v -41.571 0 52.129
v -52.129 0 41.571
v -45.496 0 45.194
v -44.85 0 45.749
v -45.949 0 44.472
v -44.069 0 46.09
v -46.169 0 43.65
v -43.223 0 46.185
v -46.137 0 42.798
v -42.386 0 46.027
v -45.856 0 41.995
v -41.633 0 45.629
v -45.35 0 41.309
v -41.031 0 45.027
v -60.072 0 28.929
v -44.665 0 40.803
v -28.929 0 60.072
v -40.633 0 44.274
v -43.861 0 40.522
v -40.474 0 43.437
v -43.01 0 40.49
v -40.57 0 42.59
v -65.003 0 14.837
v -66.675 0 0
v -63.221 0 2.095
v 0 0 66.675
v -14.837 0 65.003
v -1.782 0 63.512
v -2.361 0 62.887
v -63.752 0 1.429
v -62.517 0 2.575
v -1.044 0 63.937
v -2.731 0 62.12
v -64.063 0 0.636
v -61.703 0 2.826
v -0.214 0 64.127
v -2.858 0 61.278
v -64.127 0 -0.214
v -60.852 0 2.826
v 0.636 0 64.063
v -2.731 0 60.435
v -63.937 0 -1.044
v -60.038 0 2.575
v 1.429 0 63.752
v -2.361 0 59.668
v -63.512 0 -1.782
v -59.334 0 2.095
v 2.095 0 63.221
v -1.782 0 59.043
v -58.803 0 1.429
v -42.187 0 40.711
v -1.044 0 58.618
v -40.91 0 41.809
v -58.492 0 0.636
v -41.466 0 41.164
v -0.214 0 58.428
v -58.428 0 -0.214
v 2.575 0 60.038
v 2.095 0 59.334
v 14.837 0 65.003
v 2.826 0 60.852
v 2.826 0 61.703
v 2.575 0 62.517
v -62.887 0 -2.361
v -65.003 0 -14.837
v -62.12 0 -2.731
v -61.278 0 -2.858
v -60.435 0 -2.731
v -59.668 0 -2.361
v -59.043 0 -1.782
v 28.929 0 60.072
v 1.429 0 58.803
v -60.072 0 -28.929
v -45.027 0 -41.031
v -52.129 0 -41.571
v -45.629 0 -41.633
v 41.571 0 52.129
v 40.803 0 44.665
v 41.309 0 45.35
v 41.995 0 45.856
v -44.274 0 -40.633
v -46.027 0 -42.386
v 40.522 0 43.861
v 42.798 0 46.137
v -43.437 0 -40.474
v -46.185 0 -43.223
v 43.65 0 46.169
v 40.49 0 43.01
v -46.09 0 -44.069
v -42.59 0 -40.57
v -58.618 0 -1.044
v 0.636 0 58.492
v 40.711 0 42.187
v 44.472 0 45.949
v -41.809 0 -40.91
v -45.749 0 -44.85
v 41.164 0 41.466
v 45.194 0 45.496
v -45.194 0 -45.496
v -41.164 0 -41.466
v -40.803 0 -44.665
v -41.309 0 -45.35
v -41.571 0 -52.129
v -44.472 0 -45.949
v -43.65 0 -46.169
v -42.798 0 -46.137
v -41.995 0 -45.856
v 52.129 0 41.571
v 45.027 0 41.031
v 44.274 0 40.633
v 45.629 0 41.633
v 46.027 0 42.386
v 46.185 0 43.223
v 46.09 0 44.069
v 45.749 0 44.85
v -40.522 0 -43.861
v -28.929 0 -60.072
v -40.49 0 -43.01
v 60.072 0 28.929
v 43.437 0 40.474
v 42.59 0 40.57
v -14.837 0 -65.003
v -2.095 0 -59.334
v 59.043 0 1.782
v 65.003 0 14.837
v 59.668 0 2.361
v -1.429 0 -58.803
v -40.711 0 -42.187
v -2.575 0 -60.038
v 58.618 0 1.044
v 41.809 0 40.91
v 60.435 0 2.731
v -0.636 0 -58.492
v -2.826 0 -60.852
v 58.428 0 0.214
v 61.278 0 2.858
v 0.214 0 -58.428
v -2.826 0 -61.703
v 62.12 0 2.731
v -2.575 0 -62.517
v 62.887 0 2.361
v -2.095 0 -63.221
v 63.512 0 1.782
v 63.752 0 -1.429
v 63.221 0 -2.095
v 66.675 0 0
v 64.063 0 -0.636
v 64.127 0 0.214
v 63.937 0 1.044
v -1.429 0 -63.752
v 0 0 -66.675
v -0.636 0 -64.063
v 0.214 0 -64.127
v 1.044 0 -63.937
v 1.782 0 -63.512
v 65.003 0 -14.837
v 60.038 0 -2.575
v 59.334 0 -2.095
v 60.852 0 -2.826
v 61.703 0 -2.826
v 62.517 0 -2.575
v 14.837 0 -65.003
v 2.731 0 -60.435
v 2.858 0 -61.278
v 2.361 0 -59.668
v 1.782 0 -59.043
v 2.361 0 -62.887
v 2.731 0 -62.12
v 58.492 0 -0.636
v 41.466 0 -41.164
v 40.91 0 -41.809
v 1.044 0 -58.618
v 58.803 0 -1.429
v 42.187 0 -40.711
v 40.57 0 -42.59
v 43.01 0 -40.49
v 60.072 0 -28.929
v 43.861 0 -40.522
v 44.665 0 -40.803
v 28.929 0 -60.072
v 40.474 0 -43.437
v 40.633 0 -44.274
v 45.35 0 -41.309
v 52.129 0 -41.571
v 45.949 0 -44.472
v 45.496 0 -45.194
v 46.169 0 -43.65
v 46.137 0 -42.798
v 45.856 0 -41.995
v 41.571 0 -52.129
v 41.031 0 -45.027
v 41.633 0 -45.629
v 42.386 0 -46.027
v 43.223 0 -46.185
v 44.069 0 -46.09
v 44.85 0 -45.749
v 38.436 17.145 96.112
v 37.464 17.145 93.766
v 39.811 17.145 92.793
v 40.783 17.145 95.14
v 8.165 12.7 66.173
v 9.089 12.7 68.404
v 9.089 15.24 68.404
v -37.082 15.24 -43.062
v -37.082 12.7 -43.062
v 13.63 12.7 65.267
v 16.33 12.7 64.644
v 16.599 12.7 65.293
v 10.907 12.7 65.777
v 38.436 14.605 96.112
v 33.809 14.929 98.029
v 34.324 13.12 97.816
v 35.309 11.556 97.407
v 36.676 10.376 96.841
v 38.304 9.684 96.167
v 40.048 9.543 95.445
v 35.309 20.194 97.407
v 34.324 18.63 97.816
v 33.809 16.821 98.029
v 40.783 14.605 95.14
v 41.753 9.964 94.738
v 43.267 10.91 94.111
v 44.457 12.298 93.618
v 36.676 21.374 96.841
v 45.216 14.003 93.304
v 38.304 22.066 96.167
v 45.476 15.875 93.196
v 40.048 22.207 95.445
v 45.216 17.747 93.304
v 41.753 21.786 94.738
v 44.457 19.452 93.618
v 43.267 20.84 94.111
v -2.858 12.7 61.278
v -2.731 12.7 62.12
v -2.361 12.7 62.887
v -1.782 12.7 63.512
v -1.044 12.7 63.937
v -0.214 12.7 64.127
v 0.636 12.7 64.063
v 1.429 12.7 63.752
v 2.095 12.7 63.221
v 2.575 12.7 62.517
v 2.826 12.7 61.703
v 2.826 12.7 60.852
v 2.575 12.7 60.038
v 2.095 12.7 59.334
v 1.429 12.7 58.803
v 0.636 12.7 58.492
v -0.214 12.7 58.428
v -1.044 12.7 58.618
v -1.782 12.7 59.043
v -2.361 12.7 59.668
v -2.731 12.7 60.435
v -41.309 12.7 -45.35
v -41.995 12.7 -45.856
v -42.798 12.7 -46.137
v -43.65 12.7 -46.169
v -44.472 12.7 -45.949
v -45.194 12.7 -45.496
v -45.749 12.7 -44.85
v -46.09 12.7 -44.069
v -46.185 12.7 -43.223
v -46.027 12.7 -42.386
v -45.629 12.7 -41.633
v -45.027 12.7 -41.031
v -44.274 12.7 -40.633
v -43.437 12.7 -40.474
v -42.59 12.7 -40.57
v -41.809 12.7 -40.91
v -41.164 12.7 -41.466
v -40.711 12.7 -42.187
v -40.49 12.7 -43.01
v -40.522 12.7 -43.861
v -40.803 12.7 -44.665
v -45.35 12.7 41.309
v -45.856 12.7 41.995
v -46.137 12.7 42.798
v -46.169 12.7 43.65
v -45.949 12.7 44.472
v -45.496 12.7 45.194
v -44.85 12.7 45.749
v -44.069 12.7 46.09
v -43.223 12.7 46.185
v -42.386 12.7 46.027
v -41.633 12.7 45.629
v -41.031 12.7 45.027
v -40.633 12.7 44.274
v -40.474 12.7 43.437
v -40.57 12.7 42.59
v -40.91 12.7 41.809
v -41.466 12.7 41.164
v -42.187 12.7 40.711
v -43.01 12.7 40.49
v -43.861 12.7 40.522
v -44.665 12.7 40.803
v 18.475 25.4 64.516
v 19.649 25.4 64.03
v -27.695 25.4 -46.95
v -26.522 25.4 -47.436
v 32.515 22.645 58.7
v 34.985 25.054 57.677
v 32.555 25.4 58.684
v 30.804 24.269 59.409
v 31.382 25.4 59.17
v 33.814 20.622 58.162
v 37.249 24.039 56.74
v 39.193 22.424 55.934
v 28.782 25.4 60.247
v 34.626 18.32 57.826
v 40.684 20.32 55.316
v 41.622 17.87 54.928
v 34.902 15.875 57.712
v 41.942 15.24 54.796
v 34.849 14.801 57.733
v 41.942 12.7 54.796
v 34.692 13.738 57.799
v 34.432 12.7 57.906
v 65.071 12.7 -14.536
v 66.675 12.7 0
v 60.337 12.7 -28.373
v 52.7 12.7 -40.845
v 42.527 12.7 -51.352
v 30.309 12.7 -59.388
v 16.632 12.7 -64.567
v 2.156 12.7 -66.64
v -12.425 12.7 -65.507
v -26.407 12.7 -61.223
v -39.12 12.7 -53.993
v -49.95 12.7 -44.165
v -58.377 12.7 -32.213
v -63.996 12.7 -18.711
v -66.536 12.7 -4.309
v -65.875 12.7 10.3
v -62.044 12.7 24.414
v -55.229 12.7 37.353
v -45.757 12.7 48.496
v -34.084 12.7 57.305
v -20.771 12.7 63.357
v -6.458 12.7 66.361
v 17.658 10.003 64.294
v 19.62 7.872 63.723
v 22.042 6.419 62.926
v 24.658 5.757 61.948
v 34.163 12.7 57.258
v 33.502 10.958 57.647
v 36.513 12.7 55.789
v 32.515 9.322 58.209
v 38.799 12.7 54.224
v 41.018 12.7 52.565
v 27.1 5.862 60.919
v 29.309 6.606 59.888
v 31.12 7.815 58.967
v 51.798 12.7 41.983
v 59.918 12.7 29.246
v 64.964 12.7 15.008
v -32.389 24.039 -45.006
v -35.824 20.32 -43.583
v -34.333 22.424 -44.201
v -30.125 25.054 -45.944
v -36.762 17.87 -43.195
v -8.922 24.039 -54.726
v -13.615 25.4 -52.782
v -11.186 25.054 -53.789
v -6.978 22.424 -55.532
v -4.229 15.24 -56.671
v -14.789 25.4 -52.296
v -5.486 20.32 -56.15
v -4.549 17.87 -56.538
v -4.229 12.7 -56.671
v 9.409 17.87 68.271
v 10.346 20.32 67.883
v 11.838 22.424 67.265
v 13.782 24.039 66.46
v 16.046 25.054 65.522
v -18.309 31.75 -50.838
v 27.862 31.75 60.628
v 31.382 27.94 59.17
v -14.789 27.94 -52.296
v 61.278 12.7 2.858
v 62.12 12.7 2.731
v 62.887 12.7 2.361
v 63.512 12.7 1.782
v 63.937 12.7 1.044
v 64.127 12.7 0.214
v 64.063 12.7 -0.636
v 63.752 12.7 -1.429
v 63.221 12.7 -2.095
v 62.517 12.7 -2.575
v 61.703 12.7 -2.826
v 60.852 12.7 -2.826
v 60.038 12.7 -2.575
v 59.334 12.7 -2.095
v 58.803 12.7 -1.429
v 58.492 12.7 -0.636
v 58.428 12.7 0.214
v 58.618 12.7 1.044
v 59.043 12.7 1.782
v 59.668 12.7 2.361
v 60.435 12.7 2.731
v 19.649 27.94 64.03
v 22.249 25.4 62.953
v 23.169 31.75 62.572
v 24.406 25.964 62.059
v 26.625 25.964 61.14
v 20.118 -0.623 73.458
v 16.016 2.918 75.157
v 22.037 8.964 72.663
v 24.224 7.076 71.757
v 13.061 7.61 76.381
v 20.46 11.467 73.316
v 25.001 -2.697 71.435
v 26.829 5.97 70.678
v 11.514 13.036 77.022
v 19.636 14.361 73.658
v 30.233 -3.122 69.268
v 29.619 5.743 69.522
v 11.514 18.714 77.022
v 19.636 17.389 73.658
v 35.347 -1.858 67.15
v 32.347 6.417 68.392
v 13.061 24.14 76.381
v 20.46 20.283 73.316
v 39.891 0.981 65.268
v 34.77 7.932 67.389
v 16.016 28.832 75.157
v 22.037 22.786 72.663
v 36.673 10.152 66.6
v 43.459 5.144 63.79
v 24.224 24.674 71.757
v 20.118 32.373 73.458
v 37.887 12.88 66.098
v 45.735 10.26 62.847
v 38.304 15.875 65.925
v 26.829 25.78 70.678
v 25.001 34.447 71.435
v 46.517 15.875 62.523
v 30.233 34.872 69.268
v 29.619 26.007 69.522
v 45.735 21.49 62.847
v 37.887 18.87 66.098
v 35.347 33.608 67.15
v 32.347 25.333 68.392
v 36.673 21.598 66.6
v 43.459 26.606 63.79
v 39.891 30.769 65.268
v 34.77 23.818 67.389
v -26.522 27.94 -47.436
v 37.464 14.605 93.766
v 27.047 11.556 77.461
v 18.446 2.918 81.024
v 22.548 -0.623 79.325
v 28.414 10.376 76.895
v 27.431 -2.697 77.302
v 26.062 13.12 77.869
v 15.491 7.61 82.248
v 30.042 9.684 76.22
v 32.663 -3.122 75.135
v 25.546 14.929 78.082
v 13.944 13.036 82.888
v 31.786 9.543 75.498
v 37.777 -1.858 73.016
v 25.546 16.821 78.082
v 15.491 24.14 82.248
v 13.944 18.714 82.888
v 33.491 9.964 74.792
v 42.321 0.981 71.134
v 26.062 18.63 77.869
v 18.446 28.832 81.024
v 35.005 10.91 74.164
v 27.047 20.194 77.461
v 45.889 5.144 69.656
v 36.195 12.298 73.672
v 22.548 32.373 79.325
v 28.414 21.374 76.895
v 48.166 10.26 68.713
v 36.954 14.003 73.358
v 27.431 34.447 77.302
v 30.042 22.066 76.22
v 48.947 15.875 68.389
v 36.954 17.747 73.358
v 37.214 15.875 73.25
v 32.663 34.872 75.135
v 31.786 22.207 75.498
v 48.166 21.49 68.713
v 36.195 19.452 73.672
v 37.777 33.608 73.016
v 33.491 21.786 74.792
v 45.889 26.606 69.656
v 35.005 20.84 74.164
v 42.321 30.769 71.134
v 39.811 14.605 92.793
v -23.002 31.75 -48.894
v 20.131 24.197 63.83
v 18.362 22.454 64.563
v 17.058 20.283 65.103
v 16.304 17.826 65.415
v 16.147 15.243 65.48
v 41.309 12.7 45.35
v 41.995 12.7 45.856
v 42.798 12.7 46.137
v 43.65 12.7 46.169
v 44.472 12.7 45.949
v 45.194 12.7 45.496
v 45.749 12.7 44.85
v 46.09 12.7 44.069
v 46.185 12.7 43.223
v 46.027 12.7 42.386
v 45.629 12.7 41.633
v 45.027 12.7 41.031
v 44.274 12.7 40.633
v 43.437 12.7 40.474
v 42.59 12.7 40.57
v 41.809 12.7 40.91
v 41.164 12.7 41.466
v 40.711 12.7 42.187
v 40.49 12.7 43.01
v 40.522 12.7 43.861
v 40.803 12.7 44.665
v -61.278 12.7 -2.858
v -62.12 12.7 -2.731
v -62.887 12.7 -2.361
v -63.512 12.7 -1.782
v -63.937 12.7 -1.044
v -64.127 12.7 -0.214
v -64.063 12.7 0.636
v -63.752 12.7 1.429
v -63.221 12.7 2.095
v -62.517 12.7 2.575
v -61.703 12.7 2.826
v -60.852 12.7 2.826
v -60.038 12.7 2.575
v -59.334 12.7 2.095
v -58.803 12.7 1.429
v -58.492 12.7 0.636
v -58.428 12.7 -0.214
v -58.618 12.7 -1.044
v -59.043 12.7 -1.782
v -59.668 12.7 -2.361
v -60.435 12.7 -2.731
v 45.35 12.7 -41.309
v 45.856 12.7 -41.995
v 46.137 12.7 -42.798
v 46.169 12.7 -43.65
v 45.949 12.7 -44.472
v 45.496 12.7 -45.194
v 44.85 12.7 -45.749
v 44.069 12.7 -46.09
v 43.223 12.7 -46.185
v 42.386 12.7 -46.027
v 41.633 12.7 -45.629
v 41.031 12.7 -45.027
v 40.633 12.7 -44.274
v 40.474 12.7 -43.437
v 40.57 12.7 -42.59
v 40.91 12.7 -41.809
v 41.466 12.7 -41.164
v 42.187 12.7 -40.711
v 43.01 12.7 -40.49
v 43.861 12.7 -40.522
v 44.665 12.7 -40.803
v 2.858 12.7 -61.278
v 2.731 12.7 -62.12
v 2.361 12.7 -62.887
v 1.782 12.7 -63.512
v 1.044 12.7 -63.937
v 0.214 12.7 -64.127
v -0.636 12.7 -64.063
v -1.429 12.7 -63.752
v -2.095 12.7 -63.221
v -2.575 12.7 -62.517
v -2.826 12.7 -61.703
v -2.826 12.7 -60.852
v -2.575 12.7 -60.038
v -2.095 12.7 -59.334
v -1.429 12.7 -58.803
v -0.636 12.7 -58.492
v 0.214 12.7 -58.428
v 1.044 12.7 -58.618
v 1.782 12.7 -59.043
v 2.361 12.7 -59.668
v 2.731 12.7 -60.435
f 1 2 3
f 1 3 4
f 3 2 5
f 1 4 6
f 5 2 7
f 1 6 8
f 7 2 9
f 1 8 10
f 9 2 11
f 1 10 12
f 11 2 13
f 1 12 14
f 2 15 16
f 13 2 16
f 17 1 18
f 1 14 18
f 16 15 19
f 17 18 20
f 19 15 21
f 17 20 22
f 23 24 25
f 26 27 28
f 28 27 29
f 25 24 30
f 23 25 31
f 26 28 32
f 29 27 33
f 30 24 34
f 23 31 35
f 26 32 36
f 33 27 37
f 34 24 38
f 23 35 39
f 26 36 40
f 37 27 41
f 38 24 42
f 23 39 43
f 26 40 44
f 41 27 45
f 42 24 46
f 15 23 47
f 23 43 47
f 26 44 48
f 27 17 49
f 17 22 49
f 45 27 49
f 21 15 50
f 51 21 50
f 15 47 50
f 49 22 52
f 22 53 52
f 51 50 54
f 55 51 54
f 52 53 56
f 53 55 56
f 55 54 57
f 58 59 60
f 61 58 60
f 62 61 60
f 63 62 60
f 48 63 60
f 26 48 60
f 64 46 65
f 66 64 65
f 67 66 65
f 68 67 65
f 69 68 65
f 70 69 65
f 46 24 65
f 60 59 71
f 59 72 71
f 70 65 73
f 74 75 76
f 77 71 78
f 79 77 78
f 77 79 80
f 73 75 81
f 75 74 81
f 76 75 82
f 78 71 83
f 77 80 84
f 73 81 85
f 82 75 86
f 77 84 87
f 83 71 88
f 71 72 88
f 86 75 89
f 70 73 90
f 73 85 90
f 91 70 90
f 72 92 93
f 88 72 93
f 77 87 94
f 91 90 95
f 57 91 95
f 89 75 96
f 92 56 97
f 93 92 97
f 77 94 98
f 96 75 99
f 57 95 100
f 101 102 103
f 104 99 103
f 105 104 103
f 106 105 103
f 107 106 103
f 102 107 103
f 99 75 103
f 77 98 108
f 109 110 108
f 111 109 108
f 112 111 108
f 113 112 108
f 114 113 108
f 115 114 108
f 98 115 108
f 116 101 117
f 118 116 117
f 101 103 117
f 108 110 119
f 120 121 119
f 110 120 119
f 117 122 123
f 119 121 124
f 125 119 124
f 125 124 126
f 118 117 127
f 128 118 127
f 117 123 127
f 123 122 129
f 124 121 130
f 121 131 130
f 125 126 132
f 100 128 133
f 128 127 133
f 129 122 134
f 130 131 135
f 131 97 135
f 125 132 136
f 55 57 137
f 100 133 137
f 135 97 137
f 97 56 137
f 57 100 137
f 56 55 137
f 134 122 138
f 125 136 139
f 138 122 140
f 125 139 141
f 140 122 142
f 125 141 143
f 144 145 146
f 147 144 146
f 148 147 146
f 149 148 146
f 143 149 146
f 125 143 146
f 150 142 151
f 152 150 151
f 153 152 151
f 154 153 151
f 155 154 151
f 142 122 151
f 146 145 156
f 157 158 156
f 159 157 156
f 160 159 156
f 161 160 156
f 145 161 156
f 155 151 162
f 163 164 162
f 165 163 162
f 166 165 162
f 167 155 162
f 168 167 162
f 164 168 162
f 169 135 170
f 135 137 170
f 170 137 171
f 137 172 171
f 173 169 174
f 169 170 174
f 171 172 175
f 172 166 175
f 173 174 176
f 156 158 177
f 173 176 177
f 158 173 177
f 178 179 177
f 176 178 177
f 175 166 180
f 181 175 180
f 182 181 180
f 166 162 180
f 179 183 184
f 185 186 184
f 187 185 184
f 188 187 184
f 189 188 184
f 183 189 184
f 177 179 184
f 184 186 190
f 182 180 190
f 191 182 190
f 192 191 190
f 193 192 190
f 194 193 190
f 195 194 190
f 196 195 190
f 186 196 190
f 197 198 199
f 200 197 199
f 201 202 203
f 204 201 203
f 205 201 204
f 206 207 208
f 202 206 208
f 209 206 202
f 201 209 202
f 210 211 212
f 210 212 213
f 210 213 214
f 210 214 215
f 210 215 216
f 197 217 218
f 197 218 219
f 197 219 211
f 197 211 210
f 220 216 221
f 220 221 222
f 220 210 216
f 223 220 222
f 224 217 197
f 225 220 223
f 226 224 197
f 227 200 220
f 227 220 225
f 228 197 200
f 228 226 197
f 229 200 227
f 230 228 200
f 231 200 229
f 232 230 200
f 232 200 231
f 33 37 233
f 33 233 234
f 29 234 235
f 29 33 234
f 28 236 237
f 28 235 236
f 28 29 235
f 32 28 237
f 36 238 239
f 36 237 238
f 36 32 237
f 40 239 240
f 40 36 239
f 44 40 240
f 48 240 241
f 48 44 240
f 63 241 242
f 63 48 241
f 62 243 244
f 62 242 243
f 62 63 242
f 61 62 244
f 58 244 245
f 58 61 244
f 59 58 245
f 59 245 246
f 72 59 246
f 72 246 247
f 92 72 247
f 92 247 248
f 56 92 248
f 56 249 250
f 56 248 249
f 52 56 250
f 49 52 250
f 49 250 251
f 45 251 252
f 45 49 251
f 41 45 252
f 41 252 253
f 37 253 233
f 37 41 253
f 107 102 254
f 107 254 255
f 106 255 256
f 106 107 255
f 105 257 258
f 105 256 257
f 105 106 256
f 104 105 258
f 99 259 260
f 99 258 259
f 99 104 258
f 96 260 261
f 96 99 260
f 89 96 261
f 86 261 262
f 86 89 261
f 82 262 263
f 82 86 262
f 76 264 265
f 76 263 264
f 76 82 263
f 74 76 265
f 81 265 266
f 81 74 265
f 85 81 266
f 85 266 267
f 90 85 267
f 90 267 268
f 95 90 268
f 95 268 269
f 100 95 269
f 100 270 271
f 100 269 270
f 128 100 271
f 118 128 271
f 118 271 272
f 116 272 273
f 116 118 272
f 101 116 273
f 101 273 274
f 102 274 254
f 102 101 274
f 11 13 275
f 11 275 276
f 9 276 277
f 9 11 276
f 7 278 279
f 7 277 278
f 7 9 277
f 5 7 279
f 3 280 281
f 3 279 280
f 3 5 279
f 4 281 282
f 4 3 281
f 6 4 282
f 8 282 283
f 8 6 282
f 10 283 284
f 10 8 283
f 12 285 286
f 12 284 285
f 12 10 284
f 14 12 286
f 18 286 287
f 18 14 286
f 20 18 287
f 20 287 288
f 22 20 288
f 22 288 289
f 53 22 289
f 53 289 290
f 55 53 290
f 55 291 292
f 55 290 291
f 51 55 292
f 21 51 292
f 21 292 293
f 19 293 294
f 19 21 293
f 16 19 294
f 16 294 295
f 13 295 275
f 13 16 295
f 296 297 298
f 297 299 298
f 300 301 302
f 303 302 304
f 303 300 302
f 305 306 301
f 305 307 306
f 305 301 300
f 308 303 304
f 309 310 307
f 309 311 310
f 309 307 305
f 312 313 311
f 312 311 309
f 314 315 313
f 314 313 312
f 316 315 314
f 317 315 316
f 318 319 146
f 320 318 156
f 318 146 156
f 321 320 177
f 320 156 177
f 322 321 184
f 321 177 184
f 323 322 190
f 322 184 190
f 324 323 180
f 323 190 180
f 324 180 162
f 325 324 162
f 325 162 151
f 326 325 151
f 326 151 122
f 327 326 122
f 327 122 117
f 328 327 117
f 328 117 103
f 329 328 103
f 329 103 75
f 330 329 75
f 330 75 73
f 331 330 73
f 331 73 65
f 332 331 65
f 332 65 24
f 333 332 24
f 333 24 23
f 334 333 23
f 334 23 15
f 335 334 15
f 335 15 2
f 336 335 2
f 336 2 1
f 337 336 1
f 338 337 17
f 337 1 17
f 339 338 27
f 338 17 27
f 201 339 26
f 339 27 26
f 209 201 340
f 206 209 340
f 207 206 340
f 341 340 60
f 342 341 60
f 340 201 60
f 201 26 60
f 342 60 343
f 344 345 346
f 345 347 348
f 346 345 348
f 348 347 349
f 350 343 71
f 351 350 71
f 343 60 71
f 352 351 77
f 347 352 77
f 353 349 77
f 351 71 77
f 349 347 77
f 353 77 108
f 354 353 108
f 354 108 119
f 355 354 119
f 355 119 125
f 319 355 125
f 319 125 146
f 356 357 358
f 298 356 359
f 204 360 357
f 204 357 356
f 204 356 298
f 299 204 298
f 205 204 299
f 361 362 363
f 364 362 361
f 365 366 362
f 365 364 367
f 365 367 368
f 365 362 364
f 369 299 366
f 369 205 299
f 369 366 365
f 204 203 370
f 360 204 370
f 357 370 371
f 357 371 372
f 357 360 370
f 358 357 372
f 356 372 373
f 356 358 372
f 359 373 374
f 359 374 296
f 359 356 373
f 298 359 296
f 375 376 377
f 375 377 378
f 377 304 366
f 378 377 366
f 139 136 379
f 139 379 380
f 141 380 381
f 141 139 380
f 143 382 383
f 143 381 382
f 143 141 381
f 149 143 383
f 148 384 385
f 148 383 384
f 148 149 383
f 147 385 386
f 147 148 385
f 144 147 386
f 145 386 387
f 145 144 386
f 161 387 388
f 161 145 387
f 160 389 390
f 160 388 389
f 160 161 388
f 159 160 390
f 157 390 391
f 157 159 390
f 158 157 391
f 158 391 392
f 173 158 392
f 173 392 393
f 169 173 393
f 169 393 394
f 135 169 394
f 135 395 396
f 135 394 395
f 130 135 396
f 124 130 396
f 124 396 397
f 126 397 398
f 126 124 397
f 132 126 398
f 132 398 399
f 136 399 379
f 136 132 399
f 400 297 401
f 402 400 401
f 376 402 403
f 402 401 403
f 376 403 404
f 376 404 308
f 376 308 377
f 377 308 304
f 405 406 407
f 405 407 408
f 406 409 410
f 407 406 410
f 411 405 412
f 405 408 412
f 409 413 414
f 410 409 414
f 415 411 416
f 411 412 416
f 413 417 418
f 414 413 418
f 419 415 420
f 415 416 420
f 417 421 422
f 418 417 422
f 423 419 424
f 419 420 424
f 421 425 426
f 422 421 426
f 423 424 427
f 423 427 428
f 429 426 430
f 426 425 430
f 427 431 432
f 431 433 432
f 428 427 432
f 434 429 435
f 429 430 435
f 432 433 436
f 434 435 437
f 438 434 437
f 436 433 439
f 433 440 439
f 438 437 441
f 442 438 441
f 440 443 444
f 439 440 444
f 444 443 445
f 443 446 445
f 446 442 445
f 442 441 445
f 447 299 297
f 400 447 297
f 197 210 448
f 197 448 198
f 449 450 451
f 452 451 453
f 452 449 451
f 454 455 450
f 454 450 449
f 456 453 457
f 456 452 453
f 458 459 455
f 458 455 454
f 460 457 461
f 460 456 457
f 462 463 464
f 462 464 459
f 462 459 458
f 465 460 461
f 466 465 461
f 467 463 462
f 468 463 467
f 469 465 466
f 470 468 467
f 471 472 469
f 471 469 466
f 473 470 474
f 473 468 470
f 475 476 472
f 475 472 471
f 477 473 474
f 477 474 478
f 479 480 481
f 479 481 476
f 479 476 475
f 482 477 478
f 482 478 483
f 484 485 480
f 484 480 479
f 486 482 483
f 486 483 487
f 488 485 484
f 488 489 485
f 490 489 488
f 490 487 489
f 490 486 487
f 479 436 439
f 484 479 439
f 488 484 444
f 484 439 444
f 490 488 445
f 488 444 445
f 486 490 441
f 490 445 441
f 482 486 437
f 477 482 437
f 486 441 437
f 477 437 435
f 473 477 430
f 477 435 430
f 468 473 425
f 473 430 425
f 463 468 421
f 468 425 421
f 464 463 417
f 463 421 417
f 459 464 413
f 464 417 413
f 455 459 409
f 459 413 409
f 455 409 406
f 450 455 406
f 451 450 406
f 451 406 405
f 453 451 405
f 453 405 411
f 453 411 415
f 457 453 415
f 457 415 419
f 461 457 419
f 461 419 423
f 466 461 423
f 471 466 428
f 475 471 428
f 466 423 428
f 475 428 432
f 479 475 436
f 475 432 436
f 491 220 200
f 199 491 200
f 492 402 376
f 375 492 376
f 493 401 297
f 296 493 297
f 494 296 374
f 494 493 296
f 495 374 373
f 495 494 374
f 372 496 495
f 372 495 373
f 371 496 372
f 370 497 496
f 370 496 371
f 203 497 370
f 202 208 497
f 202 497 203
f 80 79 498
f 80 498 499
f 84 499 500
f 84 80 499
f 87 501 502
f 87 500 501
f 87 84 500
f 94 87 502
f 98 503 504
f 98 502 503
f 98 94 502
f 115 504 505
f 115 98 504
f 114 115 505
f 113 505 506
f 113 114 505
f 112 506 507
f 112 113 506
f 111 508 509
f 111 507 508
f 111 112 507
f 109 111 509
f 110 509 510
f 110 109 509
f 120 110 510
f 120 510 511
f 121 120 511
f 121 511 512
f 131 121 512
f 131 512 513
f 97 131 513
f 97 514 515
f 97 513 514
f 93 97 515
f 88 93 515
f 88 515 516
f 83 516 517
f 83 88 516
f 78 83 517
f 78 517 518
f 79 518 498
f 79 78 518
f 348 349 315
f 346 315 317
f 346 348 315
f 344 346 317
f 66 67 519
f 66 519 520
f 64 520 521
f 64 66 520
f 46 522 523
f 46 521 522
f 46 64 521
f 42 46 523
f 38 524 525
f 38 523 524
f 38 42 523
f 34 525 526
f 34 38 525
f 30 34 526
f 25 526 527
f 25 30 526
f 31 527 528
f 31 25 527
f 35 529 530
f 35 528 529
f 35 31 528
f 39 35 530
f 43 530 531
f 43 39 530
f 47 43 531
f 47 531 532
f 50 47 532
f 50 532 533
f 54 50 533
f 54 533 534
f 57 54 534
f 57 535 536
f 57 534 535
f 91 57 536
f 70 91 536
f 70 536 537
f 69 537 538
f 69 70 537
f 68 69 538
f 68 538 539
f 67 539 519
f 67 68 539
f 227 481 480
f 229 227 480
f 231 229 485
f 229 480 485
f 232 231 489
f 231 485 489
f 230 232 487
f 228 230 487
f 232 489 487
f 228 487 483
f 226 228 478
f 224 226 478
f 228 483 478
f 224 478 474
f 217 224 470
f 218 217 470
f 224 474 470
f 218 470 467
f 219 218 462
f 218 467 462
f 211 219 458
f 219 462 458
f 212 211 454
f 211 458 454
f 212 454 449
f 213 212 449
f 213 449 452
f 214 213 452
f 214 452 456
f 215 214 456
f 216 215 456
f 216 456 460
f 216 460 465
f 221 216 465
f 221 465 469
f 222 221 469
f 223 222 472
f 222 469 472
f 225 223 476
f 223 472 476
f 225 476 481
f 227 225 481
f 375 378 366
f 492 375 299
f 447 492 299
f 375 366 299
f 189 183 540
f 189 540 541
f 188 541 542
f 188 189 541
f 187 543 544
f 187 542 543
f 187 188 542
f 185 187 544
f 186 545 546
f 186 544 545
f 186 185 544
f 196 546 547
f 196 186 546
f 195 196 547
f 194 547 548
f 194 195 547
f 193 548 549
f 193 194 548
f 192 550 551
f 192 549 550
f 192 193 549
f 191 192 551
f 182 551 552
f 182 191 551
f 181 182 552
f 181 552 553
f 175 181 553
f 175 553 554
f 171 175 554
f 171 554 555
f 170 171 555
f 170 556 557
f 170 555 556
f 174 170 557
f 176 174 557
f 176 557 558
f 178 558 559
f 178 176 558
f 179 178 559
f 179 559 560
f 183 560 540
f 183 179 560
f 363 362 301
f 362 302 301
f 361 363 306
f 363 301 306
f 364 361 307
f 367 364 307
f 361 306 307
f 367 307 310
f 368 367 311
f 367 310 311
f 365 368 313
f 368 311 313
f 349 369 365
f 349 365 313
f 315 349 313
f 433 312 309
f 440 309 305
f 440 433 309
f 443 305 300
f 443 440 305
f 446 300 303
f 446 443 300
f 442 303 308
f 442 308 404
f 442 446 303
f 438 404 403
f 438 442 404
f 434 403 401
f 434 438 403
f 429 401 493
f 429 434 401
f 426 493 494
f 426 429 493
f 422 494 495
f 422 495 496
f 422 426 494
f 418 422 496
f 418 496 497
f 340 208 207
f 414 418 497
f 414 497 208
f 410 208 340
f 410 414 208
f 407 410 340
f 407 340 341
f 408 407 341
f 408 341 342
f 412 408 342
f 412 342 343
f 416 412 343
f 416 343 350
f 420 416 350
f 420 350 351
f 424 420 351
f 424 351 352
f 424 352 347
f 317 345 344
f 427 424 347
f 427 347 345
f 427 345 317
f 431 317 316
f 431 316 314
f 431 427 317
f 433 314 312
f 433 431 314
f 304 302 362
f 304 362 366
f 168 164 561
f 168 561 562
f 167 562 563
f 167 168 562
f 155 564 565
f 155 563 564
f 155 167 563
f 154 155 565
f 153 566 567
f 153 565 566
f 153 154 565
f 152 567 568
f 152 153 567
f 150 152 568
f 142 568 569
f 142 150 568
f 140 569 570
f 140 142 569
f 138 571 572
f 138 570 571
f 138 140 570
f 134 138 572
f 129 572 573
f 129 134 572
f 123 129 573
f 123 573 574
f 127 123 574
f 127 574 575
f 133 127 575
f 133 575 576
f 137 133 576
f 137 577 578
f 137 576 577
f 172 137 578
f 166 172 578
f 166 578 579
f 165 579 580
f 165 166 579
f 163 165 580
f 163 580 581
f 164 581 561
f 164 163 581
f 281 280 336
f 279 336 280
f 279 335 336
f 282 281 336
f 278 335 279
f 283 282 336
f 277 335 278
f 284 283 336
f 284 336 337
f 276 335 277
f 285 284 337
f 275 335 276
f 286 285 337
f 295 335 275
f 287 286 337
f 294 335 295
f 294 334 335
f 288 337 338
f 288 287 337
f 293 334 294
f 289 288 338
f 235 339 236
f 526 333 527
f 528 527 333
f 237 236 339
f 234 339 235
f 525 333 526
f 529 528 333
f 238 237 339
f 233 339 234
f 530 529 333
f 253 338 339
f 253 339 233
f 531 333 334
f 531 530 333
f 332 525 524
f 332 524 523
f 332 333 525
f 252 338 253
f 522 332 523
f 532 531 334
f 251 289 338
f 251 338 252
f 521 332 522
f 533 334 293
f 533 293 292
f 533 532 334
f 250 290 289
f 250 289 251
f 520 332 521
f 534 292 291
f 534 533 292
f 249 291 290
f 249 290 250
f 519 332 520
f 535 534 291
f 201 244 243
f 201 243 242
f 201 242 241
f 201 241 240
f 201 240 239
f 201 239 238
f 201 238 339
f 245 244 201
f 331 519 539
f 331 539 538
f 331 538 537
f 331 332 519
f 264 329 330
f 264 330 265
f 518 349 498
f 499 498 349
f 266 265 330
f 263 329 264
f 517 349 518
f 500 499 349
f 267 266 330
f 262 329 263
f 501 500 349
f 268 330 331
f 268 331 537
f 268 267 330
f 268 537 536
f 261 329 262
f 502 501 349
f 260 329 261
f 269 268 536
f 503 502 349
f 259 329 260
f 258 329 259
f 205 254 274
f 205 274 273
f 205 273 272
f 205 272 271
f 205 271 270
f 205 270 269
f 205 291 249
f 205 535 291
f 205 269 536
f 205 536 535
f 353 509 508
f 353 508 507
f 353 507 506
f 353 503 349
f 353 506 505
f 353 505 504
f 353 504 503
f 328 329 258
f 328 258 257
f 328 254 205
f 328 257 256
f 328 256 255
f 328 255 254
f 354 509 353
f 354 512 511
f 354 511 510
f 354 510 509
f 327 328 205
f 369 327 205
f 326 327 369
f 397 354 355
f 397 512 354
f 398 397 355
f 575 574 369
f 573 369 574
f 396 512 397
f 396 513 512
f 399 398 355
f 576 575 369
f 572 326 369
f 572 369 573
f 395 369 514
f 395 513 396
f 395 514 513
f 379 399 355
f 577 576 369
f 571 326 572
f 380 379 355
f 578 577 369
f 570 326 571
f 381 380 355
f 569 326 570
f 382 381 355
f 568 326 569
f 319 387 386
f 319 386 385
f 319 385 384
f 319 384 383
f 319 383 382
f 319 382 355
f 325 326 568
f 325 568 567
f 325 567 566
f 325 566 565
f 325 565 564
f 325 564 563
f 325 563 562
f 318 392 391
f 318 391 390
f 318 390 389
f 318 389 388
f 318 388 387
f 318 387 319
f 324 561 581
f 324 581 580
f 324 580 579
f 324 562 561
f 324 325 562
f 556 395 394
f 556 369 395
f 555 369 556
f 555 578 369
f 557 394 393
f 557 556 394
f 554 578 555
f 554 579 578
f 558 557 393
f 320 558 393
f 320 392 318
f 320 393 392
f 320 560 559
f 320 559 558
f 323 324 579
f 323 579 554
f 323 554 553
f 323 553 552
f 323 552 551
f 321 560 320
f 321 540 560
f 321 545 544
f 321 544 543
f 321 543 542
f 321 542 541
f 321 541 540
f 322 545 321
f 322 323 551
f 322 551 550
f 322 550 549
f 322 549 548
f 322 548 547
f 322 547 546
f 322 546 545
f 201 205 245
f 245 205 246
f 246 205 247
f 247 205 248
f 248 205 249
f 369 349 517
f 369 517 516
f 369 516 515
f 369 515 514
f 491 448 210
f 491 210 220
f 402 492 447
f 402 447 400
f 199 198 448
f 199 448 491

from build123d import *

# Parameters (mm, degrees)
SKETCH1_R           = 66.675
BOSS_EXTRUDE1_DEPTH = 12.7
CUT_EXTRUDE1_START  = -13.7
SKETCH2_R           = 2.8575
CUT_EXTRUDE1_DEPTH  = 14.7
CIRPATTERN1_COUNT   = 8
BOSS_EXTRUDE2_DEPTH = 12.7
BOSS_EXTRUDE3_DEPTH = 6.35
CHAMFER1_SIZE       = 3.81
FILLET3_R           = 10.16
SKETCH7_R           = 10.16
BOSS_EXTRUDE4_DEPTH = 10.16
SKETCH8_R           = 19.05
BOSS_EXTRUDE5_DEPTH = 6.35
SKETCH9_R           = 6.35
BOSS_EXTRUDE6_DEPTH = 21.59
SKETCH11_W          = 2.54
SKETCH11_H          = 2.54
CUT_EXTRUDE2_DEPTH  = 2.54


with BuildPart() as part:
    # Sketch1 → Boss-Extrude1 (new body)
    with BuildSketch(Plane(origin=(0, 0, 0), x_dir=(1, 0, 0), z_dir=(0, 1, 0))):
        Circle(SKETCH1_R)
    extrude(amount=BOSS_EXTRUDE1_DEPTH)

    # Sketch2 → Cut-Extrude1 (cut)
    with BuildSketch(Plane(origin=(0, 12.7, 0), x_dir=(1, 0, 0), z_dir=(0, 1, 0)).offset(CUT_EXTRUDE1_START)):
        with Locations((0, 61.2775)):
            Circle(SKETCH2_R)
    cut_extrude1 = extrude(amount=CUT_EXTRUDE1_DEPTH, mode=Mode.SUBTRACT)

    # CirPattern1: Cut-Extrude1 ×8 about axis
    cirpattern1_axis = Axis((0, 0, 0), (0, 1, 0))
    for i in range(1, CIRPATTERN1_COUNT):
        add(cut_extrude1.rotate(cirpattern1_axis, i * 360 / CIRPATTERN1_COUNT), mode=Mode.SUBTRACT)

    # Sketch4 → Boss-Extrude2 (add)
    with BuildSketch(Plane(origin=(0, 12.7, 0), x_dir=(1, 0, 0), z_dir=(0, 1, 0))):
        Polygon((-37.08191635, 43.06228634), (-4.228760174, 56.670509195), (41.941995941, -54.795556403), (9.088839765, -68.403779258), align=None)
    extrude(amount=BOSS_EXTRUDE2_DEPTH)

    # Sketch5 → Boss-Extrude3 (add)
    with BuildSketch(Plane(origin=(0, 25.4, 0), x_dir=(1, 0, 0), z_dir=(0, 1, 0))):
        Polygon((-26.521973293, 47.436357972), (19.648782821, -64.029707626), (31.382052884, -59.169628035), (-14.78870323, 52.296437563), align=None)
    extrude(amount=BOSS_EXTRUDE3_DEPTH)

    # Chamfer1
    chamfer1_edges = [part.edges().sort_by_distance(p)[0] for p in [
        (-3.436595236, 31.75, 8.296674827),
        (8.296674827, 31.75, 3.436595236),
    ]]
    chamfer(chamfer1_edges, length=CHAMFER1_SIZE)

    # Fillet3
    fillet3_edges = [part.edges().sort_by_distance(p)[0] for p in [
        (18.856617884, 25.4, -0.937476396),
        (-13.996538293, 25.4, 12.670746459),
    ]]
    fillet(fillet3_edges, radius=FILLET3_R)

    # Sketch7 → Boss-Extrude4 (add)
    with BuildSketch(Plane(origin=(28.917473567, 0, 69.812956874), x_dir=(0.923879533, 0, -0.382683432), z_dir=(0.382683432, 0, 0.923879533))):
        with Locations((0, 15.875)):
            Circle(SKETCH7_R)
    extrude(amount=-BOSS_EXTRUDE4_DEPTH)

    # Sketch8 → Boss-Extrude5 (add)
    with BuildSketch(Plane(origin=(28.917473567, 0, 69.812956874), x_dir=(0.923879533, 0, -0.382683432), z_dir=(0.382683432, 0, 0.923879533))):
        with Locations((0, 15.875)):
            Circle(SKETCH8_R)
    extrude(amount=BOSS_EXTRUDE5_DEPTH)

    # Sketch9 → Boss-Extrude6 (add)
    with BuildSketch(Plane(origin=(31.347513362, 0, 75.679591906), x_dir=(0.923879533, 0, -0.382683432), z_dir=(0.382683432, 0, 0.923879533))):
        with Locations((0, 15.875)):
            Circle(SKETCH9_R)
    extrude(amount=BOSS_EXTRUDE6_DEPTH)

    # Sketch11 → Cut-Extrude2 (cut)
    with BuildSketch(Plane(origin=(39.609648667, 0, 95.626151013), x_dir=(0.923879533, 0, -0.382683432), z_dir=(0.382683432, 0, 0.923879533))):
        with Locations((0, 15.875)):
            Rectangle(SKETCH11_W, SKETCH11_H)
    extrude(amount=-CUT_EXTRUDE2_DEPTH, mode=Mode.SUBTRACT)


solid = part.part
